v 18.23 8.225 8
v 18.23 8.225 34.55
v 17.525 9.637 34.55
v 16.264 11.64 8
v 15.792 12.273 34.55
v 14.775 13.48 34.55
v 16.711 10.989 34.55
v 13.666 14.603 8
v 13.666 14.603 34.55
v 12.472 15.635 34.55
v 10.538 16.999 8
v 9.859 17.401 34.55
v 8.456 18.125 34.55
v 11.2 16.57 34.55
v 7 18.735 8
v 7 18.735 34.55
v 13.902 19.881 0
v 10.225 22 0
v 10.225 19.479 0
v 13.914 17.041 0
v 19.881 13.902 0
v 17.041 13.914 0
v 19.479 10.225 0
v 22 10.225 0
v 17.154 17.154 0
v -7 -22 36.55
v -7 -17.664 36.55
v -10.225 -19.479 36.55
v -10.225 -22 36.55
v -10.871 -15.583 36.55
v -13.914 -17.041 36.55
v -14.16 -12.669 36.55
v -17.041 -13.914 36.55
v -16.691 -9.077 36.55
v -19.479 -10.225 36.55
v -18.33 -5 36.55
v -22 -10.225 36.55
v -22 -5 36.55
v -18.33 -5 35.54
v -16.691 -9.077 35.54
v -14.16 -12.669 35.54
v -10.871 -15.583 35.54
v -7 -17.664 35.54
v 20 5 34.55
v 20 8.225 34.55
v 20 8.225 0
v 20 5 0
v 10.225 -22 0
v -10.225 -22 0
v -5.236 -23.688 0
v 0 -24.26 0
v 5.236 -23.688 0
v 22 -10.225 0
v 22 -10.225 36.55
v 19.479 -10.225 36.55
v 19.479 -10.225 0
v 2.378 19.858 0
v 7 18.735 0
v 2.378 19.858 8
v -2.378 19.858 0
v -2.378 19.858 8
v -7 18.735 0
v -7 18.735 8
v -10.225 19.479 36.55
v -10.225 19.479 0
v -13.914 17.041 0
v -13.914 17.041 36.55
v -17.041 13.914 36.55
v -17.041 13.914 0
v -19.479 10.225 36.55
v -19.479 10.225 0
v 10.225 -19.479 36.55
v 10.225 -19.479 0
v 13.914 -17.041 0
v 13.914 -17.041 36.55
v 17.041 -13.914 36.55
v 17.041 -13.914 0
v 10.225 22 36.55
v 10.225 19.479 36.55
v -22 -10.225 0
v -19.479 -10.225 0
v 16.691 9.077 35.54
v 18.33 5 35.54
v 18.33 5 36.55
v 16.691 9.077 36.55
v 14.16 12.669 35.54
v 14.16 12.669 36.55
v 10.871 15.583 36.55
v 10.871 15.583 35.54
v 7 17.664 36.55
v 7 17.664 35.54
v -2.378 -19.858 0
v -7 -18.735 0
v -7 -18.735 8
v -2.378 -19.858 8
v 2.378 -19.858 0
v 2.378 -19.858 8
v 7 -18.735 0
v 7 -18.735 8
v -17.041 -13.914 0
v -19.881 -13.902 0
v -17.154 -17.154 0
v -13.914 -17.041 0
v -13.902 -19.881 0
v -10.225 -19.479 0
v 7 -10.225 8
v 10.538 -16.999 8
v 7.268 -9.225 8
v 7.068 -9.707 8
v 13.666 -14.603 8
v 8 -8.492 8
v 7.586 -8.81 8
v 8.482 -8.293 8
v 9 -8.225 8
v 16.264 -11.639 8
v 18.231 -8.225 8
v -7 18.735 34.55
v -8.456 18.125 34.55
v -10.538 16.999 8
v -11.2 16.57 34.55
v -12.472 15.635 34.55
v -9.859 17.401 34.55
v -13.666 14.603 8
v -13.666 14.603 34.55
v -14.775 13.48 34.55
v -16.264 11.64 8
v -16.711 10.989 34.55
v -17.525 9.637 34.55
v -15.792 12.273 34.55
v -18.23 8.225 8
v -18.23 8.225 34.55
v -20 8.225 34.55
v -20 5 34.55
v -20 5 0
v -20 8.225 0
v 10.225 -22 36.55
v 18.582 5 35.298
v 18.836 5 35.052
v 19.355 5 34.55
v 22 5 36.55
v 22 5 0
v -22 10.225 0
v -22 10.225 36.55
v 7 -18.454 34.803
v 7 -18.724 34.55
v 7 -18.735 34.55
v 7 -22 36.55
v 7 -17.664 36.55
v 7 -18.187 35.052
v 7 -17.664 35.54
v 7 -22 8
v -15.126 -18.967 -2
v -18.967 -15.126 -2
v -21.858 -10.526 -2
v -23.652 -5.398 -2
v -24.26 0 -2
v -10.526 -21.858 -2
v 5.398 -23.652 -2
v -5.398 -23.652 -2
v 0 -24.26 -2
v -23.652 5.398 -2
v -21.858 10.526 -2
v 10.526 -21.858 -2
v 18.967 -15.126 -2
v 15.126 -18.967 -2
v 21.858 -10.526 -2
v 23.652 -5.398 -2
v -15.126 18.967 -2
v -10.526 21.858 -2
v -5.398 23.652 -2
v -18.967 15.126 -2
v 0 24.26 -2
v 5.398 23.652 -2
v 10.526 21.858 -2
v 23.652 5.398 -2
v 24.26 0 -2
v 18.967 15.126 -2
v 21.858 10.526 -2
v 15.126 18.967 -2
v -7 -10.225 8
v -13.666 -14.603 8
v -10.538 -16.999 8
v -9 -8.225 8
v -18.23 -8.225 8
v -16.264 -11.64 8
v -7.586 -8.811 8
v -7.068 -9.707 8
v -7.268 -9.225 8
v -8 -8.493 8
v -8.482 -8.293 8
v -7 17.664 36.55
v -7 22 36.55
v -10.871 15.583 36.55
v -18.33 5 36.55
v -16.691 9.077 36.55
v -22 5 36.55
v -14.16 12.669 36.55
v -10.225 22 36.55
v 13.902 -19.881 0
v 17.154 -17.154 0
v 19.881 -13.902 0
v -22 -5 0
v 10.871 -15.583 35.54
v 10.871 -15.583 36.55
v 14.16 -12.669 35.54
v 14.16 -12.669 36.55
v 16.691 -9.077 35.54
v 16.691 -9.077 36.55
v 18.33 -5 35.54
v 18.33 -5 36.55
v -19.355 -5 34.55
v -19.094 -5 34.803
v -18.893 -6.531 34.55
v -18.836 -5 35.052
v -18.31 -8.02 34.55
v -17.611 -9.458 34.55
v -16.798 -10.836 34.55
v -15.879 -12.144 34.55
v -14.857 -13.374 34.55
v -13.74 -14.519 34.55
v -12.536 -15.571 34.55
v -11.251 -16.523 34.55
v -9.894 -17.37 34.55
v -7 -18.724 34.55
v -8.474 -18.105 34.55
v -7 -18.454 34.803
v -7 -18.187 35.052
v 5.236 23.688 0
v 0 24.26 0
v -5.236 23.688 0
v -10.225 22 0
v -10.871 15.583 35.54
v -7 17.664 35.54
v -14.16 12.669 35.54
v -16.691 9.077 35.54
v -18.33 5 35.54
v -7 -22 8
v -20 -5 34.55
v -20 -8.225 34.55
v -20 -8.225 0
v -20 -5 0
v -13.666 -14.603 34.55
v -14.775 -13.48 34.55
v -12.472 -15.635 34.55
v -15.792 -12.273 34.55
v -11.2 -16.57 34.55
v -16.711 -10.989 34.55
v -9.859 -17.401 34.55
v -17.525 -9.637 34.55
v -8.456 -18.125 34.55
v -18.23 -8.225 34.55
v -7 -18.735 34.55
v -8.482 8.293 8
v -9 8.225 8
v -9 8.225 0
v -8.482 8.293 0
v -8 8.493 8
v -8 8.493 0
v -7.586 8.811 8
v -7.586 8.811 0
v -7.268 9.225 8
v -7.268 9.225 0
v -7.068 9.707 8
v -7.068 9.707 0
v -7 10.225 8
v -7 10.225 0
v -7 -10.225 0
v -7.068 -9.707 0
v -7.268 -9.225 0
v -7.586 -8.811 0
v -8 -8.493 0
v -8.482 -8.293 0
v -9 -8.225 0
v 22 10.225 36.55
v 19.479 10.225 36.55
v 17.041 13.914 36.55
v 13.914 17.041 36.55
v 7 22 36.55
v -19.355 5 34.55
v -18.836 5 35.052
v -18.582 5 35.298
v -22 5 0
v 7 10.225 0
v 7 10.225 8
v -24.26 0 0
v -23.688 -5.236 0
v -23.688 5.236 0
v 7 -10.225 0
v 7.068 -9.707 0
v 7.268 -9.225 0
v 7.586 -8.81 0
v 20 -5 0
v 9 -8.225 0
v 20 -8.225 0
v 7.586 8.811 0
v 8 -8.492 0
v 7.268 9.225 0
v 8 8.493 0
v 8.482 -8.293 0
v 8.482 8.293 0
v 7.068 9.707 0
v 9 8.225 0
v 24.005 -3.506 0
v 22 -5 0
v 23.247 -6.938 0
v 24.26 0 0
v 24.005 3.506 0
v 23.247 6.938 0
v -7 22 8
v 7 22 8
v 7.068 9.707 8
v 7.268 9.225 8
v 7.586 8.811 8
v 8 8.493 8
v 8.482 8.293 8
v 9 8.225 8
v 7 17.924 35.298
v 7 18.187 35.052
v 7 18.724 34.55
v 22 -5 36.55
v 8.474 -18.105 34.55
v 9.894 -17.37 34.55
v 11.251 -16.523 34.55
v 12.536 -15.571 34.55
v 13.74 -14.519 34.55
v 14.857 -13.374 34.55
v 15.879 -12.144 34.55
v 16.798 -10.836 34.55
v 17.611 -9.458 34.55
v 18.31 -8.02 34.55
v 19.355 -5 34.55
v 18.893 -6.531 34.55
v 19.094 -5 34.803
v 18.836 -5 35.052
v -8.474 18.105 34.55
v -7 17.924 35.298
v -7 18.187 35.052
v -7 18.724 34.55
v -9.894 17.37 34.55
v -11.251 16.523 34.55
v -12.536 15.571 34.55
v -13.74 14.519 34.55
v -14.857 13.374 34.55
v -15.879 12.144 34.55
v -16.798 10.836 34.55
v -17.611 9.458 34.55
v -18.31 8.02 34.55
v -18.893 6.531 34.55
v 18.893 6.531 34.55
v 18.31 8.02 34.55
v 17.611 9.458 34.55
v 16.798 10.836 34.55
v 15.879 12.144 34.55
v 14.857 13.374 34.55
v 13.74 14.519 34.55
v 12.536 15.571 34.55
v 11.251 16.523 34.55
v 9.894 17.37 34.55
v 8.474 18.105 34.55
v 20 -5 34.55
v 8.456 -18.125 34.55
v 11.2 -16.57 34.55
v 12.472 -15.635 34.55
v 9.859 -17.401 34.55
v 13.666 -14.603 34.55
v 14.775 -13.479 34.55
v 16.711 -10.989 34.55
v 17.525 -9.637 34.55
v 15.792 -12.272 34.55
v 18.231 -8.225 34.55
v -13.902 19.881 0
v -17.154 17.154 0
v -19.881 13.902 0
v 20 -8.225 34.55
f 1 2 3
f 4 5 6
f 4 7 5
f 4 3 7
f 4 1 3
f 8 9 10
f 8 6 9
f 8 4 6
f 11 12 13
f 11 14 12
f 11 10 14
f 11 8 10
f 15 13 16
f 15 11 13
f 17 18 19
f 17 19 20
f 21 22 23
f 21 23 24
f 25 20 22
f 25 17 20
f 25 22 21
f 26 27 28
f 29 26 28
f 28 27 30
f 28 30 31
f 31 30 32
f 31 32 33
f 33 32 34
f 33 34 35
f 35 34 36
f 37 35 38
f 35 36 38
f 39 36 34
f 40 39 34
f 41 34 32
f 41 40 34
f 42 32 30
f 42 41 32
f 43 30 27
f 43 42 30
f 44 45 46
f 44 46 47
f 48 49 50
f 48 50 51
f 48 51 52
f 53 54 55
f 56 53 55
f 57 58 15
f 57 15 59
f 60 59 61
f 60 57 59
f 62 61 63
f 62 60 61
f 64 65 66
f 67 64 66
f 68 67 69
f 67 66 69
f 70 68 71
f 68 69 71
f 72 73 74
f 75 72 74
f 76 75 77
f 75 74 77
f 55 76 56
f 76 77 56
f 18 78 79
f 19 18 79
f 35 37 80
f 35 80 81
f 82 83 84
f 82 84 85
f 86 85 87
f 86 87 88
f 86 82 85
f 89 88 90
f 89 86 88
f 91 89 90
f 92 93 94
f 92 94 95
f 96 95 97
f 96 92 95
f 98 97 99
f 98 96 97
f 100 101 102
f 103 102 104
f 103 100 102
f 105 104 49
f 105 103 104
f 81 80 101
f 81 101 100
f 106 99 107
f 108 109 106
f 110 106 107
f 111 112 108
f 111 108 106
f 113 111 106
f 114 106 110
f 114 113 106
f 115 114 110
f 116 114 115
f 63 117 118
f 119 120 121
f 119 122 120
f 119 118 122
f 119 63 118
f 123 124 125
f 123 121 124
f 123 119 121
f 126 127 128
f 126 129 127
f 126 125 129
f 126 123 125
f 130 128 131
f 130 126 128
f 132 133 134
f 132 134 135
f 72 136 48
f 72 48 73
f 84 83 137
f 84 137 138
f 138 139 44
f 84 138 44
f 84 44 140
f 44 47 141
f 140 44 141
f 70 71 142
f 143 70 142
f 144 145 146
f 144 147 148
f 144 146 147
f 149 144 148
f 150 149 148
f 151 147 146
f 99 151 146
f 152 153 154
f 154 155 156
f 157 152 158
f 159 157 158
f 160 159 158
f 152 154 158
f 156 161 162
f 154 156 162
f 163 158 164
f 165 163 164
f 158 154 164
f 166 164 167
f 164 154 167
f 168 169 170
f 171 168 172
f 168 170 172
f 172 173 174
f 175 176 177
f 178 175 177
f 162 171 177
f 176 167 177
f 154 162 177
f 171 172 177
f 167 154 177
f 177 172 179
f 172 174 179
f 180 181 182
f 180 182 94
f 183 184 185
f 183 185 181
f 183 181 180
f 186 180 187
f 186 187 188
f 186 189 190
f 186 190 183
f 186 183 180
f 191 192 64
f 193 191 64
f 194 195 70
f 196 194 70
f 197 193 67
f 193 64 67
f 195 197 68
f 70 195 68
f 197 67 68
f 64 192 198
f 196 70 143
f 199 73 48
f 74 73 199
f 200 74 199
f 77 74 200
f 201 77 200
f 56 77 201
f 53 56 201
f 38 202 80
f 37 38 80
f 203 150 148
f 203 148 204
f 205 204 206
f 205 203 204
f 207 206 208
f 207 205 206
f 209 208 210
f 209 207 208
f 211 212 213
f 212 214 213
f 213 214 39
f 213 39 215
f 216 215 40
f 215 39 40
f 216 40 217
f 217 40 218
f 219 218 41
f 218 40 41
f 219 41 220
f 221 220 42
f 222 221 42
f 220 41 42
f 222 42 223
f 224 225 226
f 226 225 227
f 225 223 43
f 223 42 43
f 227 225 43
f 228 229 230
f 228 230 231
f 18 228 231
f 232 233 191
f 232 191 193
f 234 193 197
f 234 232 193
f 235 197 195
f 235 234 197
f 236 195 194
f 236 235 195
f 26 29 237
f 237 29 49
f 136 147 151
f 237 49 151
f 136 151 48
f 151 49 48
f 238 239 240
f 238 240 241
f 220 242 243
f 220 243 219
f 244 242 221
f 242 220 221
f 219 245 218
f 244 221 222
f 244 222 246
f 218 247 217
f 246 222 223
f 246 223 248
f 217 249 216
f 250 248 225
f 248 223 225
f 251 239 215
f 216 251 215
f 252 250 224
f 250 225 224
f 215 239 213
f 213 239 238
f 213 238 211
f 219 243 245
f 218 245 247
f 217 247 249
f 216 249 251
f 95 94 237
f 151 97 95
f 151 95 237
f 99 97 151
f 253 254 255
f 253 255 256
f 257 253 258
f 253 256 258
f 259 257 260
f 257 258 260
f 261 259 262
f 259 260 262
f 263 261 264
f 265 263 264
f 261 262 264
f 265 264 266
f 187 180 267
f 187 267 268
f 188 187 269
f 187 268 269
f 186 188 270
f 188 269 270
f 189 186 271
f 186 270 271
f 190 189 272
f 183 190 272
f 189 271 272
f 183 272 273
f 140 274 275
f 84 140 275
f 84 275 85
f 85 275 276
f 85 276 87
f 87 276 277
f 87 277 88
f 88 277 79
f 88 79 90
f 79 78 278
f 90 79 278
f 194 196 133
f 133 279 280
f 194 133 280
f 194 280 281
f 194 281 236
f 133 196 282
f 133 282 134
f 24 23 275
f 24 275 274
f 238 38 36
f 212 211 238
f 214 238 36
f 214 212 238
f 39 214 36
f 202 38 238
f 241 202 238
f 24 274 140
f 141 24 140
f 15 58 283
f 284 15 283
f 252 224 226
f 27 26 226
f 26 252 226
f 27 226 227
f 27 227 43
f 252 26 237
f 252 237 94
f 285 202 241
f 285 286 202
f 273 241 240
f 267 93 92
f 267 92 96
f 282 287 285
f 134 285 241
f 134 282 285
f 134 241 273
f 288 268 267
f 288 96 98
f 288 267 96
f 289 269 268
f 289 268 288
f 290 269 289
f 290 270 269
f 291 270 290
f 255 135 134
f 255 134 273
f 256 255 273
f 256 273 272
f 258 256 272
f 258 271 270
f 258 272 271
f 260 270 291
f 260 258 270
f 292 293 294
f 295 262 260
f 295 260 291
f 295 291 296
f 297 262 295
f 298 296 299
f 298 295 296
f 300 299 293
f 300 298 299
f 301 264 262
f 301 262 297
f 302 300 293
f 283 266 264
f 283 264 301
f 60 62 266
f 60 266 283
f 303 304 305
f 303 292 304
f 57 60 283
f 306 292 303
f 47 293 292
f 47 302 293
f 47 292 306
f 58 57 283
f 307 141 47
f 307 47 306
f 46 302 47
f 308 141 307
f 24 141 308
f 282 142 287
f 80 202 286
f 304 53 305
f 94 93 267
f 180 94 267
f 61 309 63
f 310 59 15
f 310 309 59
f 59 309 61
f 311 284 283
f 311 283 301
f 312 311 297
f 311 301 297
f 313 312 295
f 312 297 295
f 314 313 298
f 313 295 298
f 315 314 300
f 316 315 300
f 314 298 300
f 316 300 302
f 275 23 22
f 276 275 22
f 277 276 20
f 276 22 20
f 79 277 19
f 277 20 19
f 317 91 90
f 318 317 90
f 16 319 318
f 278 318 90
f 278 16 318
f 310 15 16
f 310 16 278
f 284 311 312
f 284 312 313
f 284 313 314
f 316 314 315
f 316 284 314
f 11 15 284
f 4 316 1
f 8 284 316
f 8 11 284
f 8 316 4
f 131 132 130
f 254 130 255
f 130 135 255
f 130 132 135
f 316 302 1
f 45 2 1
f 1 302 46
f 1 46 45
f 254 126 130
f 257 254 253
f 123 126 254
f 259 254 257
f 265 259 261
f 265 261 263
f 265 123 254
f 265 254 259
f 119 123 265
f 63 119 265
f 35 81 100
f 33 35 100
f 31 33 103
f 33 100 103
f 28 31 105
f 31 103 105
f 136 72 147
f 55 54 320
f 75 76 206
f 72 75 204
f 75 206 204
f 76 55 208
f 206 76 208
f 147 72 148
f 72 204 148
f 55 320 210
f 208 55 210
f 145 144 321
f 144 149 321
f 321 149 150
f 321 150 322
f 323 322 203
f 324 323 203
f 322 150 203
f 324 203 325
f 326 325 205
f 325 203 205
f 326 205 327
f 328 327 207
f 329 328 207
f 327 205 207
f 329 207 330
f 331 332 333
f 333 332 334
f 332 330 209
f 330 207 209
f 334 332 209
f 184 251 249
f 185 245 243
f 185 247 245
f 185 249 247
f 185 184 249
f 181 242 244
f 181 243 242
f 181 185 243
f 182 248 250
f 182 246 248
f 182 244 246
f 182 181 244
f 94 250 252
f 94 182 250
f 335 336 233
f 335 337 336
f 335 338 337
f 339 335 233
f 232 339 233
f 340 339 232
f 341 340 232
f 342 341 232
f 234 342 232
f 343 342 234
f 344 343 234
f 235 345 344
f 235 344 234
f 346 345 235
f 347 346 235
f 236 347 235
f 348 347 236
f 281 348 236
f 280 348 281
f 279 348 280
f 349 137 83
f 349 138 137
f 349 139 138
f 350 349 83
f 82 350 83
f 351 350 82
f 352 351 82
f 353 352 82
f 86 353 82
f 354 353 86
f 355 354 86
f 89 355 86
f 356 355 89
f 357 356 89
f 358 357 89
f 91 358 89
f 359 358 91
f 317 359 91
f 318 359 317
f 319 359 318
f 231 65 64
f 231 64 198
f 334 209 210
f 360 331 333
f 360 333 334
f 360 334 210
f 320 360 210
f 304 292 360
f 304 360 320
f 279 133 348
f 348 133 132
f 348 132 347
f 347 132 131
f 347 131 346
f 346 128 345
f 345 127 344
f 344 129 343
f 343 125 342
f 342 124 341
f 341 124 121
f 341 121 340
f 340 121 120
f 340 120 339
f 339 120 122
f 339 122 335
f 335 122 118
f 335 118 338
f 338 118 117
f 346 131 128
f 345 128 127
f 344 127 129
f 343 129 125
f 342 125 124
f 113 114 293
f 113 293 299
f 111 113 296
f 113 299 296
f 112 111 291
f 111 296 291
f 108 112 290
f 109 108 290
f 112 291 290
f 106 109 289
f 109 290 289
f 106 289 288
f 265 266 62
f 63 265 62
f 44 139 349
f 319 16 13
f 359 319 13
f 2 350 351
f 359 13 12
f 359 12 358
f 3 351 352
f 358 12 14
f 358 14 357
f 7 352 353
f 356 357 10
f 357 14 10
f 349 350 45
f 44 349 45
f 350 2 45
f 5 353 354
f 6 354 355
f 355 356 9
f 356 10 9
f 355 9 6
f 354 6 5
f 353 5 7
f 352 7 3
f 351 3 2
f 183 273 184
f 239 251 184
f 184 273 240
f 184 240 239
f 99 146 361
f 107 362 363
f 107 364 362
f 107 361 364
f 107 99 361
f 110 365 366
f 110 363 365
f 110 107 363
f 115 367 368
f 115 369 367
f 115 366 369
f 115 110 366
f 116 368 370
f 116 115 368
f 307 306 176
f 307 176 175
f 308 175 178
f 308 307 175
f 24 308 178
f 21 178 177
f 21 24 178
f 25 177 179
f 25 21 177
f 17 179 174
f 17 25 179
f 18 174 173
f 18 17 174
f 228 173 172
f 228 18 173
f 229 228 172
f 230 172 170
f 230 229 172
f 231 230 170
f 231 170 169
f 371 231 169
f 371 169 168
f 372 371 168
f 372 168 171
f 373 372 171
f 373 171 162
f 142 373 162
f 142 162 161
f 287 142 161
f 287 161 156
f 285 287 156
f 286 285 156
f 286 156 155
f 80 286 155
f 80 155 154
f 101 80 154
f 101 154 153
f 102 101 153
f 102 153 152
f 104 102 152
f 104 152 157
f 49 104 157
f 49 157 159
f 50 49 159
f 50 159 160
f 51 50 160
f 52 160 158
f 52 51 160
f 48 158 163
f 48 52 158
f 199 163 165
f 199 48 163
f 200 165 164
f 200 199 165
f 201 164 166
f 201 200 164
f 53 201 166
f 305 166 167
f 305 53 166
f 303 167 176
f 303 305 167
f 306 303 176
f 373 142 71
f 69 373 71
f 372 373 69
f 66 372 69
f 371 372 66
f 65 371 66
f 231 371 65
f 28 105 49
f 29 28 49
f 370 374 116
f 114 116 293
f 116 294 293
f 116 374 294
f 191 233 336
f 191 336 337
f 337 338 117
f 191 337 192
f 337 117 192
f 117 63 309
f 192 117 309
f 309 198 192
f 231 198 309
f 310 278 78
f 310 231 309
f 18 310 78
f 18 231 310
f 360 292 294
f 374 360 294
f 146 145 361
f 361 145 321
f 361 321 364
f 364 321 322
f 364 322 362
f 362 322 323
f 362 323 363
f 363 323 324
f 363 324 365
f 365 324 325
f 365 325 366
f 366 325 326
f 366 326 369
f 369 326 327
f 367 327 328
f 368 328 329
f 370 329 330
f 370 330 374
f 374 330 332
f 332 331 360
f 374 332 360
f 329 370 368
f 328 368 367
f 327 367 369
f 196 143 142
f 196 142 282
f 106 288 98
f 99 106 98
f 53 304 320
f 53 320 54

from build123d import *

# Parameters (mm, degrees)
PAD_DEPTH       = 36.55
SKETCH001_R     = 24.260062
PAD001_DEPTH    = 2
PAD002_DEPTH    = 8
PAD003_START    = 34.55
SKETCH005_R     = 22
SKETCH005_R_2   = 19
PAD003_DEPTH    = 2
SKETCH002_W     = 60
SKETCH002_H     = 10
POCKET002_DEPTH = 36.551
POCKET003_START = 8
SKETCH003_W     = 14
SKETCH003_H     = 60
POCKET003_DEPTH = 52
CHAMFER_SIZE    = 0.99


with BuildPart() as part:
    # Sketch → Pad (new body)
    with BuildSketch(Plane.XY):
        with BuildLine():
            Line((19.47946, 10.225), (22, 10.225))
            Line((22, 10.225), (22, -10.225))
            Line((22, -10.225), (19.47946, -10.225))
            ThreePointArc((10.225, -19.47946), (15.556349, -15.556349), (19.47946, -10.225))
            Line((10.225, -22), (10.225, -19.47946))
            Line((-10.225, -22), (10.225, -22))
            Line((-10.225, -19.47946), (-10.225, -22))
            ThreePointArc((-19.47946, -10.225), (-15.556349, -15.556349), (-10.225, -19.47946))
            Line((-22, -10.225), (-19.47946, -10.225))
            Line((-22, 10.225), (-22, -10.225))
            Line((-19.47946, 10.225), (-22, 10.225))
            ThreePointArc((-10.225, 19.47946), (-15.556349, 15.556349), (-19.47946, 10.225))
            Line((-10.225, 19.47946), (-10.225, 22))
            Line((-10.225, 22), (10.225, 22))
            Line((10.225, 22), (10.225, 19.47946))
            ThreePointArc((19.47946, 10.225), (15.556349, 15.556349), (10.225, 19.47946))
        make_face()
        with BuildLine():
            Line((-20, 0), (-20, 8.225))
            Line((-20, 8.225), (-18.230452, 8.225))
            ThreePointArc((18.230452, 8.225), (0, 20), (-18.230452, 8.225))
            Line((18.230452, 8.225), (20, 8.225))
            Line((20, 8.225), (20, 0.000241))
            Line((20, 0.000241), (20, -8.224518))
            Line((20, -8.224518), (18.230669, -8.224518))
            ThreePointArc((-18.230452, -8.225), (0.000264, -20), (18.230669, -8.224518))
            Line((-20, -8.225), (-18.230452, -8.225))
            Line((-20, 0), (-20, -8.225))
        make_face(mode=Mode.SUBTRACT)
    extrude(amount=PAD_DEPTH)

    # Sketch001 → Pad001 (join)
    with BuildSketch(Plane.XY):
        Circle(SKETCH001_R)
    extrude(amount=-PAD001_DEPTH)

    # Sketch004 → Pad002 (join)
    with BuildSketch(Plane.XY):
        with BuildLine():
            ThreePointArc((-7, 18.734994), (-13.665977, 14.602776), (-18.230452, 8.225))
            Line((-18.230452, 8.225), (-9, 8.225))
            ThreePointArc((-9, 8.225), (-7.585786, 8.810786), (-7, 10.225))
            Line((-7, 10.225), (-7, 18.734994))
        make_face()
        with BuildLine():
            ThreePointArc((18.230452, 8.225), (13.665977, 14.602776), (7, 18.734994))
            Line((7, 18.734994), (7, 10.225))
            ThreePointArc((7, 10.225), (7.585786, 8.810786), (9, 8.225))
            Line((9, 8.225), (18.230452, 8.225))
        make_face()
        with BuildLine():
            ThreePointArc((7, -18.734994), (13.66617, -14.602596), (18.230669, -8.224518))
            Line((18.230669, -8.224518), (9, -8.224518))
            ThreePointArc((9, -8.224518), (7.585786, -8.810305), (7, -10.224518))
            Line((7, -10.224518), (7, -18.734994))
        make_face()
        with BuildLine():
            ThreePointArc((-18.230452, -8.225), (-13.665977, -14.602776), (-7, -18.734994))
            Line((-7, -18.734994), (-7, -10.225))
            ThreePointArc((-7, -10.225), (-7.585786, -8.810786), (-9, -8.225))
            Line((-9, -8.225), (-18.230452, -8.225))
        make_face()
    extrude(amount=PAD002_DEPTH)

    # Sketch005 → Pad003 (join)
    with BuildSketch(Plane.XY.offset(PAD003_START)):
        Circle(SKETCH005_R)
        Circle(SKETCH005_R_2, mode=Mode.SUBTRACT)
    extrude(amount=PAD003_DEPTH)

    # Sketch002 → Pocket002 (cut, through all)
    with BuildSketch(Plane.XY):
        Rectangle(SKETCH002_W, SKETCH002_H)
    extrude(amount=POCKET002_DEPTH, mode=Mode.SUBTRACT)

    # Sketch003 → Pocket003 (cut)
    with BuildSketch(Plane.XY.offset(POCKET003_START)):
        Rectangle(SKETCH003_W, SKETCH003_H)
    extrude(amount=POCKET003_DEPTH, mode=Mode.SUBTRACT)

    # Chamfer
    chamfer_edges = [part.edges().sort_by_distance(p)[0] for p in [
        (-14.159705, 12.668968, 34.55),
        (-14.159705, -12.668968, 34.55),
        (14.159705, 12.668968, 34.55),
        (14.159705, -12.668968, 34.55),
    ]]
    chamfer(chamfer_edges, length=CHAMFER_SIZE)


solid = part.part
